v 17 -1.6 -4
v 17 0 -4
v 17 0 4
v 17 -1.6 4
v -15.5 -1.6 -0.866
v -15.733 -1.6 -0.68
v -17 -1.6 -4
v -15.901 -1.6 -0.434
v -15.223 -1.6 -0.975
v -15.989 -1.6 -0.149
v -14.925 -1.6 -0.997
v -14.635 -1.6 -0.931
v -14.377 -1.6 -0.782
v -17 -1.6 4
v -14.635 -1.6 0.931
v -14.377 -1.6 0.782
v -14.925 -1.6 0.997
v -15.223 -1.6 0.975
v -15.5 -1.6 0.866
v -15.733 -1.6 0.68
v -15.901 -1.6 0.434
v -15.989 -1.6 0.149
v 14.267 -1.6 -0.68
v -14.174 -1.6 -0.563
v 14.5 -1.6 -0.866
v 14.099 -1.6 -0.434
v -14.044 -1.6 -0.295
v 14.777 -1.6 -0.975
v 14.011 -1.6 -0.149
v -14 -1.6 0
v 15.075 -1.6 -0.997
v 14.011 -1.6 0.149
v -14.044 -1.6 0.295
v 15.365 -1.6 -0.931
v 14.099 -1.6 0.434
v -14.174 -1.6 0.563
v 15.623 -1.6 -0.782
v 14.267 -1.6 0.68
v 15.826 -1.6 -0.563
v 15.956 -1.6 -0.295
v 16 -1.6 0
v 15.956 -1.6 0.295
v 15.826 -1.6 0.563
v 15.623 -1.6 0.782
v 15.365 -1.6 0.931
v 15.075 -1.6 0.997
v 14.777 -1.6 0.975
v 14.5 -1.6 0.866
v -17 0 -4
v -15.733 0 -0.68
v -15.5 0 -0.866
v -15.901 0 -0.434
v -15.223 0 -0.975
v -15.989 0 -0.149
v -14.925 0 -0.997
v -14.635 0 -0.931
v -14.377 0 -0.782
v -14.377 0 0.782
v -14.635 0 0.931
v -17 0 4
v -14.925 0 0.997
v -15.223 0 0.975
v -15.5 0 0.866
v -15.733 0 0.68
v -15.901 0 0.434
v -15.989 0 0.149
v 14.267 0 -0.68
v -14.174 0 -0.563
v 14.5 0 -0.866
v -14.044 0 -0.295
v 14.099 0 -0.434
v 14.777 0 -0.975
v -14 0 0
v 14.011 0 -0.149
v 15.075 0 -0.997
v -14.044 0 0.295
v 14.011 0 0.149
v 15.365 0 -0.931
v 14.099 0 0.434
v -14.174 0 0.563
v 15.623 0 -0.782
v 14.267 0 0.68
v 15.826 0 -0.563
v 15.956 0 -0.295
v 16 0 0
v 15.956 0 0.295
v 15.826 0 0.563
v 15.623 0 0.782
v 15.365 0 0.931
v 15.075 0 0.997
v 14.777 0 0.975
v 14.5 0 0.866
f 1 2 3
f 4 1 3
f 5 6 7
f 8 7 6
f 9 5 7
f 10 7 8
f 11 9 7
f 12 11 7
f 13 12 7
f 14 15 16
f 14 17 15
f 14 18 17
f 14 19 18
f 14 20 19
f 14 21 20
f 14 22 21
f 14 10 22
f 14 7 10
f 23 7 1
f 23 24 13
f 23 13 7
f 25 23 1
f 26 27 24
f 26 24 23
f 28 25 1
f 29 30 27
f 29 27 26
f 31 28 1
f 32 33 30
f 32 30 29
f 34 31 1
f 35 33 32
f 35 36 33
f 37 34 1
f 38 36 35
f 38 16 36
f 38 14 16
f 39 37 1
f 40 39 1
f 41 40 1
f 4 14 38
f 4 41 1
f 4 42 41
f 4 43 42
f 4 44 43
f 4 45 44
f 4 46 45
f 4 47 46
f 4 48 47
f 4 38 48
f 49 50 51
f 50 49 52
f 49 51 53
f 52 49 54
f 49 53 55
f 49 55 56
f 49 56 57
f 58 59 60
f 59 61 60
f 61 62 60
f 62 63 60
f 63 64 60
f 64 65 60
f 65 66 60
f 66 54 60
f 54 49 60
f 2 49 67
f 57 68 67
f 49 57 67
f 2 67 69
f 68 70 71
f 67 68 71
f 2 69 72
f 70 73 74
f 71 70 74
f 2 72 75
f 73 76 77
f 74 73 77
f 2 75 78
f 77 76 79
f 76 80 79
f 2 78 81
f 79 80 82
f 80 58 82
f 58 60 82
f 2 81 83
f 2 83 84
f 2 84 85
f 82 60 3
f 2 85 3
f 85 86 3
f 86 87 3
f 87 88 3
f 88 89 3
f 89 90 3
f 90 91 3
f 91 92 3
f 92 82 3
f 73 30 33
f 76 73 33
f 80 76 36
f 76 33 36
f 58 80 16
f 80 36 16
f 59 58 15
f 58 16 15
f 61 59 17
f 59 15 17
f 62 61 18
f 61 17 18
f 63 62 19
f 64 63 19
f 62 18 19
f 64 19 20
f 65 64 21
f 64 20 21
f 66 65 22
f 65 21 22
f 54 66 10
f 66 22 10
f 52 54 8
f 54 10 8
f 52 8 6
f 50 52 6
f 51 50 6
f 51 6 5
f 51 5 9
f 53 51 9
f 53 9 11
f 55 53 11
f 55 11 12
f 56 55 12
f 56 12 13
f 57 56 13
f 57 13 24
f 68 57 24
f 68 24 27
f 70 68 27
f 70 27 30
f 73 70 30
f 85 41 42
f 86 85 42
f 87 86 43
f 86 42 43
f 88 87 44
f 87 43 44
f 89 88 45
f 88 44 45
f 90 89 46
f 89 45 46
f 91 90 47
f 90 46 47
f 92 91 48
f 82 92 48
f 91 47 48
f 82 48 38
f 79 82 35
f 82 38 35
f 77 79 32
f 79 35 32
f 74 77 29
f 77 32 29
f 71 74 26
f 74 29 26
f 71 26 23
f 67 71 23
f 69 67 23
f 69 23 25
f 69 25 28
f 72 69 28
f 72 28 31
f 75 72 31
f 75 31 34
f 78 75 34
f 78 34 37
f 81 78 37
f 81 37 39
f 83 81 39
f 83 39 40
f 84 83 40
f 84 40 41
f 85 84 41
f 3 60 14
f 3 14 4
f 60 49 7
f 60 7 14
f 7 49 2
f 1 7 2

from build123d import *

# Parameters (mm, degrees)
F0_W     = 34
F0_H     = 8
F1_DEPTH = 1.6
F2_R     = 1
F3_DEPTH = 1.601


with BuildPart() as f1:
    # F0 (on Front) → F1 (new body)
    with BuildSketch(Plane.XZ):
        Rectangle(F0_W, F0_H)
    extrude(amount=F1_DEPTH)

    # F2 (on face) → F3 (cut, through all)
    with BuildSketch(Plane.XZ.offset(1.6)):
        with Locations((-15, 0)):
            Circle(F2_R)
        with Locations((15, 0)):
            Circle(F2_R)
    extrude(amount=-F3_DEPTH, mode=Mode.SUBTRACT)


solid = f1.part
